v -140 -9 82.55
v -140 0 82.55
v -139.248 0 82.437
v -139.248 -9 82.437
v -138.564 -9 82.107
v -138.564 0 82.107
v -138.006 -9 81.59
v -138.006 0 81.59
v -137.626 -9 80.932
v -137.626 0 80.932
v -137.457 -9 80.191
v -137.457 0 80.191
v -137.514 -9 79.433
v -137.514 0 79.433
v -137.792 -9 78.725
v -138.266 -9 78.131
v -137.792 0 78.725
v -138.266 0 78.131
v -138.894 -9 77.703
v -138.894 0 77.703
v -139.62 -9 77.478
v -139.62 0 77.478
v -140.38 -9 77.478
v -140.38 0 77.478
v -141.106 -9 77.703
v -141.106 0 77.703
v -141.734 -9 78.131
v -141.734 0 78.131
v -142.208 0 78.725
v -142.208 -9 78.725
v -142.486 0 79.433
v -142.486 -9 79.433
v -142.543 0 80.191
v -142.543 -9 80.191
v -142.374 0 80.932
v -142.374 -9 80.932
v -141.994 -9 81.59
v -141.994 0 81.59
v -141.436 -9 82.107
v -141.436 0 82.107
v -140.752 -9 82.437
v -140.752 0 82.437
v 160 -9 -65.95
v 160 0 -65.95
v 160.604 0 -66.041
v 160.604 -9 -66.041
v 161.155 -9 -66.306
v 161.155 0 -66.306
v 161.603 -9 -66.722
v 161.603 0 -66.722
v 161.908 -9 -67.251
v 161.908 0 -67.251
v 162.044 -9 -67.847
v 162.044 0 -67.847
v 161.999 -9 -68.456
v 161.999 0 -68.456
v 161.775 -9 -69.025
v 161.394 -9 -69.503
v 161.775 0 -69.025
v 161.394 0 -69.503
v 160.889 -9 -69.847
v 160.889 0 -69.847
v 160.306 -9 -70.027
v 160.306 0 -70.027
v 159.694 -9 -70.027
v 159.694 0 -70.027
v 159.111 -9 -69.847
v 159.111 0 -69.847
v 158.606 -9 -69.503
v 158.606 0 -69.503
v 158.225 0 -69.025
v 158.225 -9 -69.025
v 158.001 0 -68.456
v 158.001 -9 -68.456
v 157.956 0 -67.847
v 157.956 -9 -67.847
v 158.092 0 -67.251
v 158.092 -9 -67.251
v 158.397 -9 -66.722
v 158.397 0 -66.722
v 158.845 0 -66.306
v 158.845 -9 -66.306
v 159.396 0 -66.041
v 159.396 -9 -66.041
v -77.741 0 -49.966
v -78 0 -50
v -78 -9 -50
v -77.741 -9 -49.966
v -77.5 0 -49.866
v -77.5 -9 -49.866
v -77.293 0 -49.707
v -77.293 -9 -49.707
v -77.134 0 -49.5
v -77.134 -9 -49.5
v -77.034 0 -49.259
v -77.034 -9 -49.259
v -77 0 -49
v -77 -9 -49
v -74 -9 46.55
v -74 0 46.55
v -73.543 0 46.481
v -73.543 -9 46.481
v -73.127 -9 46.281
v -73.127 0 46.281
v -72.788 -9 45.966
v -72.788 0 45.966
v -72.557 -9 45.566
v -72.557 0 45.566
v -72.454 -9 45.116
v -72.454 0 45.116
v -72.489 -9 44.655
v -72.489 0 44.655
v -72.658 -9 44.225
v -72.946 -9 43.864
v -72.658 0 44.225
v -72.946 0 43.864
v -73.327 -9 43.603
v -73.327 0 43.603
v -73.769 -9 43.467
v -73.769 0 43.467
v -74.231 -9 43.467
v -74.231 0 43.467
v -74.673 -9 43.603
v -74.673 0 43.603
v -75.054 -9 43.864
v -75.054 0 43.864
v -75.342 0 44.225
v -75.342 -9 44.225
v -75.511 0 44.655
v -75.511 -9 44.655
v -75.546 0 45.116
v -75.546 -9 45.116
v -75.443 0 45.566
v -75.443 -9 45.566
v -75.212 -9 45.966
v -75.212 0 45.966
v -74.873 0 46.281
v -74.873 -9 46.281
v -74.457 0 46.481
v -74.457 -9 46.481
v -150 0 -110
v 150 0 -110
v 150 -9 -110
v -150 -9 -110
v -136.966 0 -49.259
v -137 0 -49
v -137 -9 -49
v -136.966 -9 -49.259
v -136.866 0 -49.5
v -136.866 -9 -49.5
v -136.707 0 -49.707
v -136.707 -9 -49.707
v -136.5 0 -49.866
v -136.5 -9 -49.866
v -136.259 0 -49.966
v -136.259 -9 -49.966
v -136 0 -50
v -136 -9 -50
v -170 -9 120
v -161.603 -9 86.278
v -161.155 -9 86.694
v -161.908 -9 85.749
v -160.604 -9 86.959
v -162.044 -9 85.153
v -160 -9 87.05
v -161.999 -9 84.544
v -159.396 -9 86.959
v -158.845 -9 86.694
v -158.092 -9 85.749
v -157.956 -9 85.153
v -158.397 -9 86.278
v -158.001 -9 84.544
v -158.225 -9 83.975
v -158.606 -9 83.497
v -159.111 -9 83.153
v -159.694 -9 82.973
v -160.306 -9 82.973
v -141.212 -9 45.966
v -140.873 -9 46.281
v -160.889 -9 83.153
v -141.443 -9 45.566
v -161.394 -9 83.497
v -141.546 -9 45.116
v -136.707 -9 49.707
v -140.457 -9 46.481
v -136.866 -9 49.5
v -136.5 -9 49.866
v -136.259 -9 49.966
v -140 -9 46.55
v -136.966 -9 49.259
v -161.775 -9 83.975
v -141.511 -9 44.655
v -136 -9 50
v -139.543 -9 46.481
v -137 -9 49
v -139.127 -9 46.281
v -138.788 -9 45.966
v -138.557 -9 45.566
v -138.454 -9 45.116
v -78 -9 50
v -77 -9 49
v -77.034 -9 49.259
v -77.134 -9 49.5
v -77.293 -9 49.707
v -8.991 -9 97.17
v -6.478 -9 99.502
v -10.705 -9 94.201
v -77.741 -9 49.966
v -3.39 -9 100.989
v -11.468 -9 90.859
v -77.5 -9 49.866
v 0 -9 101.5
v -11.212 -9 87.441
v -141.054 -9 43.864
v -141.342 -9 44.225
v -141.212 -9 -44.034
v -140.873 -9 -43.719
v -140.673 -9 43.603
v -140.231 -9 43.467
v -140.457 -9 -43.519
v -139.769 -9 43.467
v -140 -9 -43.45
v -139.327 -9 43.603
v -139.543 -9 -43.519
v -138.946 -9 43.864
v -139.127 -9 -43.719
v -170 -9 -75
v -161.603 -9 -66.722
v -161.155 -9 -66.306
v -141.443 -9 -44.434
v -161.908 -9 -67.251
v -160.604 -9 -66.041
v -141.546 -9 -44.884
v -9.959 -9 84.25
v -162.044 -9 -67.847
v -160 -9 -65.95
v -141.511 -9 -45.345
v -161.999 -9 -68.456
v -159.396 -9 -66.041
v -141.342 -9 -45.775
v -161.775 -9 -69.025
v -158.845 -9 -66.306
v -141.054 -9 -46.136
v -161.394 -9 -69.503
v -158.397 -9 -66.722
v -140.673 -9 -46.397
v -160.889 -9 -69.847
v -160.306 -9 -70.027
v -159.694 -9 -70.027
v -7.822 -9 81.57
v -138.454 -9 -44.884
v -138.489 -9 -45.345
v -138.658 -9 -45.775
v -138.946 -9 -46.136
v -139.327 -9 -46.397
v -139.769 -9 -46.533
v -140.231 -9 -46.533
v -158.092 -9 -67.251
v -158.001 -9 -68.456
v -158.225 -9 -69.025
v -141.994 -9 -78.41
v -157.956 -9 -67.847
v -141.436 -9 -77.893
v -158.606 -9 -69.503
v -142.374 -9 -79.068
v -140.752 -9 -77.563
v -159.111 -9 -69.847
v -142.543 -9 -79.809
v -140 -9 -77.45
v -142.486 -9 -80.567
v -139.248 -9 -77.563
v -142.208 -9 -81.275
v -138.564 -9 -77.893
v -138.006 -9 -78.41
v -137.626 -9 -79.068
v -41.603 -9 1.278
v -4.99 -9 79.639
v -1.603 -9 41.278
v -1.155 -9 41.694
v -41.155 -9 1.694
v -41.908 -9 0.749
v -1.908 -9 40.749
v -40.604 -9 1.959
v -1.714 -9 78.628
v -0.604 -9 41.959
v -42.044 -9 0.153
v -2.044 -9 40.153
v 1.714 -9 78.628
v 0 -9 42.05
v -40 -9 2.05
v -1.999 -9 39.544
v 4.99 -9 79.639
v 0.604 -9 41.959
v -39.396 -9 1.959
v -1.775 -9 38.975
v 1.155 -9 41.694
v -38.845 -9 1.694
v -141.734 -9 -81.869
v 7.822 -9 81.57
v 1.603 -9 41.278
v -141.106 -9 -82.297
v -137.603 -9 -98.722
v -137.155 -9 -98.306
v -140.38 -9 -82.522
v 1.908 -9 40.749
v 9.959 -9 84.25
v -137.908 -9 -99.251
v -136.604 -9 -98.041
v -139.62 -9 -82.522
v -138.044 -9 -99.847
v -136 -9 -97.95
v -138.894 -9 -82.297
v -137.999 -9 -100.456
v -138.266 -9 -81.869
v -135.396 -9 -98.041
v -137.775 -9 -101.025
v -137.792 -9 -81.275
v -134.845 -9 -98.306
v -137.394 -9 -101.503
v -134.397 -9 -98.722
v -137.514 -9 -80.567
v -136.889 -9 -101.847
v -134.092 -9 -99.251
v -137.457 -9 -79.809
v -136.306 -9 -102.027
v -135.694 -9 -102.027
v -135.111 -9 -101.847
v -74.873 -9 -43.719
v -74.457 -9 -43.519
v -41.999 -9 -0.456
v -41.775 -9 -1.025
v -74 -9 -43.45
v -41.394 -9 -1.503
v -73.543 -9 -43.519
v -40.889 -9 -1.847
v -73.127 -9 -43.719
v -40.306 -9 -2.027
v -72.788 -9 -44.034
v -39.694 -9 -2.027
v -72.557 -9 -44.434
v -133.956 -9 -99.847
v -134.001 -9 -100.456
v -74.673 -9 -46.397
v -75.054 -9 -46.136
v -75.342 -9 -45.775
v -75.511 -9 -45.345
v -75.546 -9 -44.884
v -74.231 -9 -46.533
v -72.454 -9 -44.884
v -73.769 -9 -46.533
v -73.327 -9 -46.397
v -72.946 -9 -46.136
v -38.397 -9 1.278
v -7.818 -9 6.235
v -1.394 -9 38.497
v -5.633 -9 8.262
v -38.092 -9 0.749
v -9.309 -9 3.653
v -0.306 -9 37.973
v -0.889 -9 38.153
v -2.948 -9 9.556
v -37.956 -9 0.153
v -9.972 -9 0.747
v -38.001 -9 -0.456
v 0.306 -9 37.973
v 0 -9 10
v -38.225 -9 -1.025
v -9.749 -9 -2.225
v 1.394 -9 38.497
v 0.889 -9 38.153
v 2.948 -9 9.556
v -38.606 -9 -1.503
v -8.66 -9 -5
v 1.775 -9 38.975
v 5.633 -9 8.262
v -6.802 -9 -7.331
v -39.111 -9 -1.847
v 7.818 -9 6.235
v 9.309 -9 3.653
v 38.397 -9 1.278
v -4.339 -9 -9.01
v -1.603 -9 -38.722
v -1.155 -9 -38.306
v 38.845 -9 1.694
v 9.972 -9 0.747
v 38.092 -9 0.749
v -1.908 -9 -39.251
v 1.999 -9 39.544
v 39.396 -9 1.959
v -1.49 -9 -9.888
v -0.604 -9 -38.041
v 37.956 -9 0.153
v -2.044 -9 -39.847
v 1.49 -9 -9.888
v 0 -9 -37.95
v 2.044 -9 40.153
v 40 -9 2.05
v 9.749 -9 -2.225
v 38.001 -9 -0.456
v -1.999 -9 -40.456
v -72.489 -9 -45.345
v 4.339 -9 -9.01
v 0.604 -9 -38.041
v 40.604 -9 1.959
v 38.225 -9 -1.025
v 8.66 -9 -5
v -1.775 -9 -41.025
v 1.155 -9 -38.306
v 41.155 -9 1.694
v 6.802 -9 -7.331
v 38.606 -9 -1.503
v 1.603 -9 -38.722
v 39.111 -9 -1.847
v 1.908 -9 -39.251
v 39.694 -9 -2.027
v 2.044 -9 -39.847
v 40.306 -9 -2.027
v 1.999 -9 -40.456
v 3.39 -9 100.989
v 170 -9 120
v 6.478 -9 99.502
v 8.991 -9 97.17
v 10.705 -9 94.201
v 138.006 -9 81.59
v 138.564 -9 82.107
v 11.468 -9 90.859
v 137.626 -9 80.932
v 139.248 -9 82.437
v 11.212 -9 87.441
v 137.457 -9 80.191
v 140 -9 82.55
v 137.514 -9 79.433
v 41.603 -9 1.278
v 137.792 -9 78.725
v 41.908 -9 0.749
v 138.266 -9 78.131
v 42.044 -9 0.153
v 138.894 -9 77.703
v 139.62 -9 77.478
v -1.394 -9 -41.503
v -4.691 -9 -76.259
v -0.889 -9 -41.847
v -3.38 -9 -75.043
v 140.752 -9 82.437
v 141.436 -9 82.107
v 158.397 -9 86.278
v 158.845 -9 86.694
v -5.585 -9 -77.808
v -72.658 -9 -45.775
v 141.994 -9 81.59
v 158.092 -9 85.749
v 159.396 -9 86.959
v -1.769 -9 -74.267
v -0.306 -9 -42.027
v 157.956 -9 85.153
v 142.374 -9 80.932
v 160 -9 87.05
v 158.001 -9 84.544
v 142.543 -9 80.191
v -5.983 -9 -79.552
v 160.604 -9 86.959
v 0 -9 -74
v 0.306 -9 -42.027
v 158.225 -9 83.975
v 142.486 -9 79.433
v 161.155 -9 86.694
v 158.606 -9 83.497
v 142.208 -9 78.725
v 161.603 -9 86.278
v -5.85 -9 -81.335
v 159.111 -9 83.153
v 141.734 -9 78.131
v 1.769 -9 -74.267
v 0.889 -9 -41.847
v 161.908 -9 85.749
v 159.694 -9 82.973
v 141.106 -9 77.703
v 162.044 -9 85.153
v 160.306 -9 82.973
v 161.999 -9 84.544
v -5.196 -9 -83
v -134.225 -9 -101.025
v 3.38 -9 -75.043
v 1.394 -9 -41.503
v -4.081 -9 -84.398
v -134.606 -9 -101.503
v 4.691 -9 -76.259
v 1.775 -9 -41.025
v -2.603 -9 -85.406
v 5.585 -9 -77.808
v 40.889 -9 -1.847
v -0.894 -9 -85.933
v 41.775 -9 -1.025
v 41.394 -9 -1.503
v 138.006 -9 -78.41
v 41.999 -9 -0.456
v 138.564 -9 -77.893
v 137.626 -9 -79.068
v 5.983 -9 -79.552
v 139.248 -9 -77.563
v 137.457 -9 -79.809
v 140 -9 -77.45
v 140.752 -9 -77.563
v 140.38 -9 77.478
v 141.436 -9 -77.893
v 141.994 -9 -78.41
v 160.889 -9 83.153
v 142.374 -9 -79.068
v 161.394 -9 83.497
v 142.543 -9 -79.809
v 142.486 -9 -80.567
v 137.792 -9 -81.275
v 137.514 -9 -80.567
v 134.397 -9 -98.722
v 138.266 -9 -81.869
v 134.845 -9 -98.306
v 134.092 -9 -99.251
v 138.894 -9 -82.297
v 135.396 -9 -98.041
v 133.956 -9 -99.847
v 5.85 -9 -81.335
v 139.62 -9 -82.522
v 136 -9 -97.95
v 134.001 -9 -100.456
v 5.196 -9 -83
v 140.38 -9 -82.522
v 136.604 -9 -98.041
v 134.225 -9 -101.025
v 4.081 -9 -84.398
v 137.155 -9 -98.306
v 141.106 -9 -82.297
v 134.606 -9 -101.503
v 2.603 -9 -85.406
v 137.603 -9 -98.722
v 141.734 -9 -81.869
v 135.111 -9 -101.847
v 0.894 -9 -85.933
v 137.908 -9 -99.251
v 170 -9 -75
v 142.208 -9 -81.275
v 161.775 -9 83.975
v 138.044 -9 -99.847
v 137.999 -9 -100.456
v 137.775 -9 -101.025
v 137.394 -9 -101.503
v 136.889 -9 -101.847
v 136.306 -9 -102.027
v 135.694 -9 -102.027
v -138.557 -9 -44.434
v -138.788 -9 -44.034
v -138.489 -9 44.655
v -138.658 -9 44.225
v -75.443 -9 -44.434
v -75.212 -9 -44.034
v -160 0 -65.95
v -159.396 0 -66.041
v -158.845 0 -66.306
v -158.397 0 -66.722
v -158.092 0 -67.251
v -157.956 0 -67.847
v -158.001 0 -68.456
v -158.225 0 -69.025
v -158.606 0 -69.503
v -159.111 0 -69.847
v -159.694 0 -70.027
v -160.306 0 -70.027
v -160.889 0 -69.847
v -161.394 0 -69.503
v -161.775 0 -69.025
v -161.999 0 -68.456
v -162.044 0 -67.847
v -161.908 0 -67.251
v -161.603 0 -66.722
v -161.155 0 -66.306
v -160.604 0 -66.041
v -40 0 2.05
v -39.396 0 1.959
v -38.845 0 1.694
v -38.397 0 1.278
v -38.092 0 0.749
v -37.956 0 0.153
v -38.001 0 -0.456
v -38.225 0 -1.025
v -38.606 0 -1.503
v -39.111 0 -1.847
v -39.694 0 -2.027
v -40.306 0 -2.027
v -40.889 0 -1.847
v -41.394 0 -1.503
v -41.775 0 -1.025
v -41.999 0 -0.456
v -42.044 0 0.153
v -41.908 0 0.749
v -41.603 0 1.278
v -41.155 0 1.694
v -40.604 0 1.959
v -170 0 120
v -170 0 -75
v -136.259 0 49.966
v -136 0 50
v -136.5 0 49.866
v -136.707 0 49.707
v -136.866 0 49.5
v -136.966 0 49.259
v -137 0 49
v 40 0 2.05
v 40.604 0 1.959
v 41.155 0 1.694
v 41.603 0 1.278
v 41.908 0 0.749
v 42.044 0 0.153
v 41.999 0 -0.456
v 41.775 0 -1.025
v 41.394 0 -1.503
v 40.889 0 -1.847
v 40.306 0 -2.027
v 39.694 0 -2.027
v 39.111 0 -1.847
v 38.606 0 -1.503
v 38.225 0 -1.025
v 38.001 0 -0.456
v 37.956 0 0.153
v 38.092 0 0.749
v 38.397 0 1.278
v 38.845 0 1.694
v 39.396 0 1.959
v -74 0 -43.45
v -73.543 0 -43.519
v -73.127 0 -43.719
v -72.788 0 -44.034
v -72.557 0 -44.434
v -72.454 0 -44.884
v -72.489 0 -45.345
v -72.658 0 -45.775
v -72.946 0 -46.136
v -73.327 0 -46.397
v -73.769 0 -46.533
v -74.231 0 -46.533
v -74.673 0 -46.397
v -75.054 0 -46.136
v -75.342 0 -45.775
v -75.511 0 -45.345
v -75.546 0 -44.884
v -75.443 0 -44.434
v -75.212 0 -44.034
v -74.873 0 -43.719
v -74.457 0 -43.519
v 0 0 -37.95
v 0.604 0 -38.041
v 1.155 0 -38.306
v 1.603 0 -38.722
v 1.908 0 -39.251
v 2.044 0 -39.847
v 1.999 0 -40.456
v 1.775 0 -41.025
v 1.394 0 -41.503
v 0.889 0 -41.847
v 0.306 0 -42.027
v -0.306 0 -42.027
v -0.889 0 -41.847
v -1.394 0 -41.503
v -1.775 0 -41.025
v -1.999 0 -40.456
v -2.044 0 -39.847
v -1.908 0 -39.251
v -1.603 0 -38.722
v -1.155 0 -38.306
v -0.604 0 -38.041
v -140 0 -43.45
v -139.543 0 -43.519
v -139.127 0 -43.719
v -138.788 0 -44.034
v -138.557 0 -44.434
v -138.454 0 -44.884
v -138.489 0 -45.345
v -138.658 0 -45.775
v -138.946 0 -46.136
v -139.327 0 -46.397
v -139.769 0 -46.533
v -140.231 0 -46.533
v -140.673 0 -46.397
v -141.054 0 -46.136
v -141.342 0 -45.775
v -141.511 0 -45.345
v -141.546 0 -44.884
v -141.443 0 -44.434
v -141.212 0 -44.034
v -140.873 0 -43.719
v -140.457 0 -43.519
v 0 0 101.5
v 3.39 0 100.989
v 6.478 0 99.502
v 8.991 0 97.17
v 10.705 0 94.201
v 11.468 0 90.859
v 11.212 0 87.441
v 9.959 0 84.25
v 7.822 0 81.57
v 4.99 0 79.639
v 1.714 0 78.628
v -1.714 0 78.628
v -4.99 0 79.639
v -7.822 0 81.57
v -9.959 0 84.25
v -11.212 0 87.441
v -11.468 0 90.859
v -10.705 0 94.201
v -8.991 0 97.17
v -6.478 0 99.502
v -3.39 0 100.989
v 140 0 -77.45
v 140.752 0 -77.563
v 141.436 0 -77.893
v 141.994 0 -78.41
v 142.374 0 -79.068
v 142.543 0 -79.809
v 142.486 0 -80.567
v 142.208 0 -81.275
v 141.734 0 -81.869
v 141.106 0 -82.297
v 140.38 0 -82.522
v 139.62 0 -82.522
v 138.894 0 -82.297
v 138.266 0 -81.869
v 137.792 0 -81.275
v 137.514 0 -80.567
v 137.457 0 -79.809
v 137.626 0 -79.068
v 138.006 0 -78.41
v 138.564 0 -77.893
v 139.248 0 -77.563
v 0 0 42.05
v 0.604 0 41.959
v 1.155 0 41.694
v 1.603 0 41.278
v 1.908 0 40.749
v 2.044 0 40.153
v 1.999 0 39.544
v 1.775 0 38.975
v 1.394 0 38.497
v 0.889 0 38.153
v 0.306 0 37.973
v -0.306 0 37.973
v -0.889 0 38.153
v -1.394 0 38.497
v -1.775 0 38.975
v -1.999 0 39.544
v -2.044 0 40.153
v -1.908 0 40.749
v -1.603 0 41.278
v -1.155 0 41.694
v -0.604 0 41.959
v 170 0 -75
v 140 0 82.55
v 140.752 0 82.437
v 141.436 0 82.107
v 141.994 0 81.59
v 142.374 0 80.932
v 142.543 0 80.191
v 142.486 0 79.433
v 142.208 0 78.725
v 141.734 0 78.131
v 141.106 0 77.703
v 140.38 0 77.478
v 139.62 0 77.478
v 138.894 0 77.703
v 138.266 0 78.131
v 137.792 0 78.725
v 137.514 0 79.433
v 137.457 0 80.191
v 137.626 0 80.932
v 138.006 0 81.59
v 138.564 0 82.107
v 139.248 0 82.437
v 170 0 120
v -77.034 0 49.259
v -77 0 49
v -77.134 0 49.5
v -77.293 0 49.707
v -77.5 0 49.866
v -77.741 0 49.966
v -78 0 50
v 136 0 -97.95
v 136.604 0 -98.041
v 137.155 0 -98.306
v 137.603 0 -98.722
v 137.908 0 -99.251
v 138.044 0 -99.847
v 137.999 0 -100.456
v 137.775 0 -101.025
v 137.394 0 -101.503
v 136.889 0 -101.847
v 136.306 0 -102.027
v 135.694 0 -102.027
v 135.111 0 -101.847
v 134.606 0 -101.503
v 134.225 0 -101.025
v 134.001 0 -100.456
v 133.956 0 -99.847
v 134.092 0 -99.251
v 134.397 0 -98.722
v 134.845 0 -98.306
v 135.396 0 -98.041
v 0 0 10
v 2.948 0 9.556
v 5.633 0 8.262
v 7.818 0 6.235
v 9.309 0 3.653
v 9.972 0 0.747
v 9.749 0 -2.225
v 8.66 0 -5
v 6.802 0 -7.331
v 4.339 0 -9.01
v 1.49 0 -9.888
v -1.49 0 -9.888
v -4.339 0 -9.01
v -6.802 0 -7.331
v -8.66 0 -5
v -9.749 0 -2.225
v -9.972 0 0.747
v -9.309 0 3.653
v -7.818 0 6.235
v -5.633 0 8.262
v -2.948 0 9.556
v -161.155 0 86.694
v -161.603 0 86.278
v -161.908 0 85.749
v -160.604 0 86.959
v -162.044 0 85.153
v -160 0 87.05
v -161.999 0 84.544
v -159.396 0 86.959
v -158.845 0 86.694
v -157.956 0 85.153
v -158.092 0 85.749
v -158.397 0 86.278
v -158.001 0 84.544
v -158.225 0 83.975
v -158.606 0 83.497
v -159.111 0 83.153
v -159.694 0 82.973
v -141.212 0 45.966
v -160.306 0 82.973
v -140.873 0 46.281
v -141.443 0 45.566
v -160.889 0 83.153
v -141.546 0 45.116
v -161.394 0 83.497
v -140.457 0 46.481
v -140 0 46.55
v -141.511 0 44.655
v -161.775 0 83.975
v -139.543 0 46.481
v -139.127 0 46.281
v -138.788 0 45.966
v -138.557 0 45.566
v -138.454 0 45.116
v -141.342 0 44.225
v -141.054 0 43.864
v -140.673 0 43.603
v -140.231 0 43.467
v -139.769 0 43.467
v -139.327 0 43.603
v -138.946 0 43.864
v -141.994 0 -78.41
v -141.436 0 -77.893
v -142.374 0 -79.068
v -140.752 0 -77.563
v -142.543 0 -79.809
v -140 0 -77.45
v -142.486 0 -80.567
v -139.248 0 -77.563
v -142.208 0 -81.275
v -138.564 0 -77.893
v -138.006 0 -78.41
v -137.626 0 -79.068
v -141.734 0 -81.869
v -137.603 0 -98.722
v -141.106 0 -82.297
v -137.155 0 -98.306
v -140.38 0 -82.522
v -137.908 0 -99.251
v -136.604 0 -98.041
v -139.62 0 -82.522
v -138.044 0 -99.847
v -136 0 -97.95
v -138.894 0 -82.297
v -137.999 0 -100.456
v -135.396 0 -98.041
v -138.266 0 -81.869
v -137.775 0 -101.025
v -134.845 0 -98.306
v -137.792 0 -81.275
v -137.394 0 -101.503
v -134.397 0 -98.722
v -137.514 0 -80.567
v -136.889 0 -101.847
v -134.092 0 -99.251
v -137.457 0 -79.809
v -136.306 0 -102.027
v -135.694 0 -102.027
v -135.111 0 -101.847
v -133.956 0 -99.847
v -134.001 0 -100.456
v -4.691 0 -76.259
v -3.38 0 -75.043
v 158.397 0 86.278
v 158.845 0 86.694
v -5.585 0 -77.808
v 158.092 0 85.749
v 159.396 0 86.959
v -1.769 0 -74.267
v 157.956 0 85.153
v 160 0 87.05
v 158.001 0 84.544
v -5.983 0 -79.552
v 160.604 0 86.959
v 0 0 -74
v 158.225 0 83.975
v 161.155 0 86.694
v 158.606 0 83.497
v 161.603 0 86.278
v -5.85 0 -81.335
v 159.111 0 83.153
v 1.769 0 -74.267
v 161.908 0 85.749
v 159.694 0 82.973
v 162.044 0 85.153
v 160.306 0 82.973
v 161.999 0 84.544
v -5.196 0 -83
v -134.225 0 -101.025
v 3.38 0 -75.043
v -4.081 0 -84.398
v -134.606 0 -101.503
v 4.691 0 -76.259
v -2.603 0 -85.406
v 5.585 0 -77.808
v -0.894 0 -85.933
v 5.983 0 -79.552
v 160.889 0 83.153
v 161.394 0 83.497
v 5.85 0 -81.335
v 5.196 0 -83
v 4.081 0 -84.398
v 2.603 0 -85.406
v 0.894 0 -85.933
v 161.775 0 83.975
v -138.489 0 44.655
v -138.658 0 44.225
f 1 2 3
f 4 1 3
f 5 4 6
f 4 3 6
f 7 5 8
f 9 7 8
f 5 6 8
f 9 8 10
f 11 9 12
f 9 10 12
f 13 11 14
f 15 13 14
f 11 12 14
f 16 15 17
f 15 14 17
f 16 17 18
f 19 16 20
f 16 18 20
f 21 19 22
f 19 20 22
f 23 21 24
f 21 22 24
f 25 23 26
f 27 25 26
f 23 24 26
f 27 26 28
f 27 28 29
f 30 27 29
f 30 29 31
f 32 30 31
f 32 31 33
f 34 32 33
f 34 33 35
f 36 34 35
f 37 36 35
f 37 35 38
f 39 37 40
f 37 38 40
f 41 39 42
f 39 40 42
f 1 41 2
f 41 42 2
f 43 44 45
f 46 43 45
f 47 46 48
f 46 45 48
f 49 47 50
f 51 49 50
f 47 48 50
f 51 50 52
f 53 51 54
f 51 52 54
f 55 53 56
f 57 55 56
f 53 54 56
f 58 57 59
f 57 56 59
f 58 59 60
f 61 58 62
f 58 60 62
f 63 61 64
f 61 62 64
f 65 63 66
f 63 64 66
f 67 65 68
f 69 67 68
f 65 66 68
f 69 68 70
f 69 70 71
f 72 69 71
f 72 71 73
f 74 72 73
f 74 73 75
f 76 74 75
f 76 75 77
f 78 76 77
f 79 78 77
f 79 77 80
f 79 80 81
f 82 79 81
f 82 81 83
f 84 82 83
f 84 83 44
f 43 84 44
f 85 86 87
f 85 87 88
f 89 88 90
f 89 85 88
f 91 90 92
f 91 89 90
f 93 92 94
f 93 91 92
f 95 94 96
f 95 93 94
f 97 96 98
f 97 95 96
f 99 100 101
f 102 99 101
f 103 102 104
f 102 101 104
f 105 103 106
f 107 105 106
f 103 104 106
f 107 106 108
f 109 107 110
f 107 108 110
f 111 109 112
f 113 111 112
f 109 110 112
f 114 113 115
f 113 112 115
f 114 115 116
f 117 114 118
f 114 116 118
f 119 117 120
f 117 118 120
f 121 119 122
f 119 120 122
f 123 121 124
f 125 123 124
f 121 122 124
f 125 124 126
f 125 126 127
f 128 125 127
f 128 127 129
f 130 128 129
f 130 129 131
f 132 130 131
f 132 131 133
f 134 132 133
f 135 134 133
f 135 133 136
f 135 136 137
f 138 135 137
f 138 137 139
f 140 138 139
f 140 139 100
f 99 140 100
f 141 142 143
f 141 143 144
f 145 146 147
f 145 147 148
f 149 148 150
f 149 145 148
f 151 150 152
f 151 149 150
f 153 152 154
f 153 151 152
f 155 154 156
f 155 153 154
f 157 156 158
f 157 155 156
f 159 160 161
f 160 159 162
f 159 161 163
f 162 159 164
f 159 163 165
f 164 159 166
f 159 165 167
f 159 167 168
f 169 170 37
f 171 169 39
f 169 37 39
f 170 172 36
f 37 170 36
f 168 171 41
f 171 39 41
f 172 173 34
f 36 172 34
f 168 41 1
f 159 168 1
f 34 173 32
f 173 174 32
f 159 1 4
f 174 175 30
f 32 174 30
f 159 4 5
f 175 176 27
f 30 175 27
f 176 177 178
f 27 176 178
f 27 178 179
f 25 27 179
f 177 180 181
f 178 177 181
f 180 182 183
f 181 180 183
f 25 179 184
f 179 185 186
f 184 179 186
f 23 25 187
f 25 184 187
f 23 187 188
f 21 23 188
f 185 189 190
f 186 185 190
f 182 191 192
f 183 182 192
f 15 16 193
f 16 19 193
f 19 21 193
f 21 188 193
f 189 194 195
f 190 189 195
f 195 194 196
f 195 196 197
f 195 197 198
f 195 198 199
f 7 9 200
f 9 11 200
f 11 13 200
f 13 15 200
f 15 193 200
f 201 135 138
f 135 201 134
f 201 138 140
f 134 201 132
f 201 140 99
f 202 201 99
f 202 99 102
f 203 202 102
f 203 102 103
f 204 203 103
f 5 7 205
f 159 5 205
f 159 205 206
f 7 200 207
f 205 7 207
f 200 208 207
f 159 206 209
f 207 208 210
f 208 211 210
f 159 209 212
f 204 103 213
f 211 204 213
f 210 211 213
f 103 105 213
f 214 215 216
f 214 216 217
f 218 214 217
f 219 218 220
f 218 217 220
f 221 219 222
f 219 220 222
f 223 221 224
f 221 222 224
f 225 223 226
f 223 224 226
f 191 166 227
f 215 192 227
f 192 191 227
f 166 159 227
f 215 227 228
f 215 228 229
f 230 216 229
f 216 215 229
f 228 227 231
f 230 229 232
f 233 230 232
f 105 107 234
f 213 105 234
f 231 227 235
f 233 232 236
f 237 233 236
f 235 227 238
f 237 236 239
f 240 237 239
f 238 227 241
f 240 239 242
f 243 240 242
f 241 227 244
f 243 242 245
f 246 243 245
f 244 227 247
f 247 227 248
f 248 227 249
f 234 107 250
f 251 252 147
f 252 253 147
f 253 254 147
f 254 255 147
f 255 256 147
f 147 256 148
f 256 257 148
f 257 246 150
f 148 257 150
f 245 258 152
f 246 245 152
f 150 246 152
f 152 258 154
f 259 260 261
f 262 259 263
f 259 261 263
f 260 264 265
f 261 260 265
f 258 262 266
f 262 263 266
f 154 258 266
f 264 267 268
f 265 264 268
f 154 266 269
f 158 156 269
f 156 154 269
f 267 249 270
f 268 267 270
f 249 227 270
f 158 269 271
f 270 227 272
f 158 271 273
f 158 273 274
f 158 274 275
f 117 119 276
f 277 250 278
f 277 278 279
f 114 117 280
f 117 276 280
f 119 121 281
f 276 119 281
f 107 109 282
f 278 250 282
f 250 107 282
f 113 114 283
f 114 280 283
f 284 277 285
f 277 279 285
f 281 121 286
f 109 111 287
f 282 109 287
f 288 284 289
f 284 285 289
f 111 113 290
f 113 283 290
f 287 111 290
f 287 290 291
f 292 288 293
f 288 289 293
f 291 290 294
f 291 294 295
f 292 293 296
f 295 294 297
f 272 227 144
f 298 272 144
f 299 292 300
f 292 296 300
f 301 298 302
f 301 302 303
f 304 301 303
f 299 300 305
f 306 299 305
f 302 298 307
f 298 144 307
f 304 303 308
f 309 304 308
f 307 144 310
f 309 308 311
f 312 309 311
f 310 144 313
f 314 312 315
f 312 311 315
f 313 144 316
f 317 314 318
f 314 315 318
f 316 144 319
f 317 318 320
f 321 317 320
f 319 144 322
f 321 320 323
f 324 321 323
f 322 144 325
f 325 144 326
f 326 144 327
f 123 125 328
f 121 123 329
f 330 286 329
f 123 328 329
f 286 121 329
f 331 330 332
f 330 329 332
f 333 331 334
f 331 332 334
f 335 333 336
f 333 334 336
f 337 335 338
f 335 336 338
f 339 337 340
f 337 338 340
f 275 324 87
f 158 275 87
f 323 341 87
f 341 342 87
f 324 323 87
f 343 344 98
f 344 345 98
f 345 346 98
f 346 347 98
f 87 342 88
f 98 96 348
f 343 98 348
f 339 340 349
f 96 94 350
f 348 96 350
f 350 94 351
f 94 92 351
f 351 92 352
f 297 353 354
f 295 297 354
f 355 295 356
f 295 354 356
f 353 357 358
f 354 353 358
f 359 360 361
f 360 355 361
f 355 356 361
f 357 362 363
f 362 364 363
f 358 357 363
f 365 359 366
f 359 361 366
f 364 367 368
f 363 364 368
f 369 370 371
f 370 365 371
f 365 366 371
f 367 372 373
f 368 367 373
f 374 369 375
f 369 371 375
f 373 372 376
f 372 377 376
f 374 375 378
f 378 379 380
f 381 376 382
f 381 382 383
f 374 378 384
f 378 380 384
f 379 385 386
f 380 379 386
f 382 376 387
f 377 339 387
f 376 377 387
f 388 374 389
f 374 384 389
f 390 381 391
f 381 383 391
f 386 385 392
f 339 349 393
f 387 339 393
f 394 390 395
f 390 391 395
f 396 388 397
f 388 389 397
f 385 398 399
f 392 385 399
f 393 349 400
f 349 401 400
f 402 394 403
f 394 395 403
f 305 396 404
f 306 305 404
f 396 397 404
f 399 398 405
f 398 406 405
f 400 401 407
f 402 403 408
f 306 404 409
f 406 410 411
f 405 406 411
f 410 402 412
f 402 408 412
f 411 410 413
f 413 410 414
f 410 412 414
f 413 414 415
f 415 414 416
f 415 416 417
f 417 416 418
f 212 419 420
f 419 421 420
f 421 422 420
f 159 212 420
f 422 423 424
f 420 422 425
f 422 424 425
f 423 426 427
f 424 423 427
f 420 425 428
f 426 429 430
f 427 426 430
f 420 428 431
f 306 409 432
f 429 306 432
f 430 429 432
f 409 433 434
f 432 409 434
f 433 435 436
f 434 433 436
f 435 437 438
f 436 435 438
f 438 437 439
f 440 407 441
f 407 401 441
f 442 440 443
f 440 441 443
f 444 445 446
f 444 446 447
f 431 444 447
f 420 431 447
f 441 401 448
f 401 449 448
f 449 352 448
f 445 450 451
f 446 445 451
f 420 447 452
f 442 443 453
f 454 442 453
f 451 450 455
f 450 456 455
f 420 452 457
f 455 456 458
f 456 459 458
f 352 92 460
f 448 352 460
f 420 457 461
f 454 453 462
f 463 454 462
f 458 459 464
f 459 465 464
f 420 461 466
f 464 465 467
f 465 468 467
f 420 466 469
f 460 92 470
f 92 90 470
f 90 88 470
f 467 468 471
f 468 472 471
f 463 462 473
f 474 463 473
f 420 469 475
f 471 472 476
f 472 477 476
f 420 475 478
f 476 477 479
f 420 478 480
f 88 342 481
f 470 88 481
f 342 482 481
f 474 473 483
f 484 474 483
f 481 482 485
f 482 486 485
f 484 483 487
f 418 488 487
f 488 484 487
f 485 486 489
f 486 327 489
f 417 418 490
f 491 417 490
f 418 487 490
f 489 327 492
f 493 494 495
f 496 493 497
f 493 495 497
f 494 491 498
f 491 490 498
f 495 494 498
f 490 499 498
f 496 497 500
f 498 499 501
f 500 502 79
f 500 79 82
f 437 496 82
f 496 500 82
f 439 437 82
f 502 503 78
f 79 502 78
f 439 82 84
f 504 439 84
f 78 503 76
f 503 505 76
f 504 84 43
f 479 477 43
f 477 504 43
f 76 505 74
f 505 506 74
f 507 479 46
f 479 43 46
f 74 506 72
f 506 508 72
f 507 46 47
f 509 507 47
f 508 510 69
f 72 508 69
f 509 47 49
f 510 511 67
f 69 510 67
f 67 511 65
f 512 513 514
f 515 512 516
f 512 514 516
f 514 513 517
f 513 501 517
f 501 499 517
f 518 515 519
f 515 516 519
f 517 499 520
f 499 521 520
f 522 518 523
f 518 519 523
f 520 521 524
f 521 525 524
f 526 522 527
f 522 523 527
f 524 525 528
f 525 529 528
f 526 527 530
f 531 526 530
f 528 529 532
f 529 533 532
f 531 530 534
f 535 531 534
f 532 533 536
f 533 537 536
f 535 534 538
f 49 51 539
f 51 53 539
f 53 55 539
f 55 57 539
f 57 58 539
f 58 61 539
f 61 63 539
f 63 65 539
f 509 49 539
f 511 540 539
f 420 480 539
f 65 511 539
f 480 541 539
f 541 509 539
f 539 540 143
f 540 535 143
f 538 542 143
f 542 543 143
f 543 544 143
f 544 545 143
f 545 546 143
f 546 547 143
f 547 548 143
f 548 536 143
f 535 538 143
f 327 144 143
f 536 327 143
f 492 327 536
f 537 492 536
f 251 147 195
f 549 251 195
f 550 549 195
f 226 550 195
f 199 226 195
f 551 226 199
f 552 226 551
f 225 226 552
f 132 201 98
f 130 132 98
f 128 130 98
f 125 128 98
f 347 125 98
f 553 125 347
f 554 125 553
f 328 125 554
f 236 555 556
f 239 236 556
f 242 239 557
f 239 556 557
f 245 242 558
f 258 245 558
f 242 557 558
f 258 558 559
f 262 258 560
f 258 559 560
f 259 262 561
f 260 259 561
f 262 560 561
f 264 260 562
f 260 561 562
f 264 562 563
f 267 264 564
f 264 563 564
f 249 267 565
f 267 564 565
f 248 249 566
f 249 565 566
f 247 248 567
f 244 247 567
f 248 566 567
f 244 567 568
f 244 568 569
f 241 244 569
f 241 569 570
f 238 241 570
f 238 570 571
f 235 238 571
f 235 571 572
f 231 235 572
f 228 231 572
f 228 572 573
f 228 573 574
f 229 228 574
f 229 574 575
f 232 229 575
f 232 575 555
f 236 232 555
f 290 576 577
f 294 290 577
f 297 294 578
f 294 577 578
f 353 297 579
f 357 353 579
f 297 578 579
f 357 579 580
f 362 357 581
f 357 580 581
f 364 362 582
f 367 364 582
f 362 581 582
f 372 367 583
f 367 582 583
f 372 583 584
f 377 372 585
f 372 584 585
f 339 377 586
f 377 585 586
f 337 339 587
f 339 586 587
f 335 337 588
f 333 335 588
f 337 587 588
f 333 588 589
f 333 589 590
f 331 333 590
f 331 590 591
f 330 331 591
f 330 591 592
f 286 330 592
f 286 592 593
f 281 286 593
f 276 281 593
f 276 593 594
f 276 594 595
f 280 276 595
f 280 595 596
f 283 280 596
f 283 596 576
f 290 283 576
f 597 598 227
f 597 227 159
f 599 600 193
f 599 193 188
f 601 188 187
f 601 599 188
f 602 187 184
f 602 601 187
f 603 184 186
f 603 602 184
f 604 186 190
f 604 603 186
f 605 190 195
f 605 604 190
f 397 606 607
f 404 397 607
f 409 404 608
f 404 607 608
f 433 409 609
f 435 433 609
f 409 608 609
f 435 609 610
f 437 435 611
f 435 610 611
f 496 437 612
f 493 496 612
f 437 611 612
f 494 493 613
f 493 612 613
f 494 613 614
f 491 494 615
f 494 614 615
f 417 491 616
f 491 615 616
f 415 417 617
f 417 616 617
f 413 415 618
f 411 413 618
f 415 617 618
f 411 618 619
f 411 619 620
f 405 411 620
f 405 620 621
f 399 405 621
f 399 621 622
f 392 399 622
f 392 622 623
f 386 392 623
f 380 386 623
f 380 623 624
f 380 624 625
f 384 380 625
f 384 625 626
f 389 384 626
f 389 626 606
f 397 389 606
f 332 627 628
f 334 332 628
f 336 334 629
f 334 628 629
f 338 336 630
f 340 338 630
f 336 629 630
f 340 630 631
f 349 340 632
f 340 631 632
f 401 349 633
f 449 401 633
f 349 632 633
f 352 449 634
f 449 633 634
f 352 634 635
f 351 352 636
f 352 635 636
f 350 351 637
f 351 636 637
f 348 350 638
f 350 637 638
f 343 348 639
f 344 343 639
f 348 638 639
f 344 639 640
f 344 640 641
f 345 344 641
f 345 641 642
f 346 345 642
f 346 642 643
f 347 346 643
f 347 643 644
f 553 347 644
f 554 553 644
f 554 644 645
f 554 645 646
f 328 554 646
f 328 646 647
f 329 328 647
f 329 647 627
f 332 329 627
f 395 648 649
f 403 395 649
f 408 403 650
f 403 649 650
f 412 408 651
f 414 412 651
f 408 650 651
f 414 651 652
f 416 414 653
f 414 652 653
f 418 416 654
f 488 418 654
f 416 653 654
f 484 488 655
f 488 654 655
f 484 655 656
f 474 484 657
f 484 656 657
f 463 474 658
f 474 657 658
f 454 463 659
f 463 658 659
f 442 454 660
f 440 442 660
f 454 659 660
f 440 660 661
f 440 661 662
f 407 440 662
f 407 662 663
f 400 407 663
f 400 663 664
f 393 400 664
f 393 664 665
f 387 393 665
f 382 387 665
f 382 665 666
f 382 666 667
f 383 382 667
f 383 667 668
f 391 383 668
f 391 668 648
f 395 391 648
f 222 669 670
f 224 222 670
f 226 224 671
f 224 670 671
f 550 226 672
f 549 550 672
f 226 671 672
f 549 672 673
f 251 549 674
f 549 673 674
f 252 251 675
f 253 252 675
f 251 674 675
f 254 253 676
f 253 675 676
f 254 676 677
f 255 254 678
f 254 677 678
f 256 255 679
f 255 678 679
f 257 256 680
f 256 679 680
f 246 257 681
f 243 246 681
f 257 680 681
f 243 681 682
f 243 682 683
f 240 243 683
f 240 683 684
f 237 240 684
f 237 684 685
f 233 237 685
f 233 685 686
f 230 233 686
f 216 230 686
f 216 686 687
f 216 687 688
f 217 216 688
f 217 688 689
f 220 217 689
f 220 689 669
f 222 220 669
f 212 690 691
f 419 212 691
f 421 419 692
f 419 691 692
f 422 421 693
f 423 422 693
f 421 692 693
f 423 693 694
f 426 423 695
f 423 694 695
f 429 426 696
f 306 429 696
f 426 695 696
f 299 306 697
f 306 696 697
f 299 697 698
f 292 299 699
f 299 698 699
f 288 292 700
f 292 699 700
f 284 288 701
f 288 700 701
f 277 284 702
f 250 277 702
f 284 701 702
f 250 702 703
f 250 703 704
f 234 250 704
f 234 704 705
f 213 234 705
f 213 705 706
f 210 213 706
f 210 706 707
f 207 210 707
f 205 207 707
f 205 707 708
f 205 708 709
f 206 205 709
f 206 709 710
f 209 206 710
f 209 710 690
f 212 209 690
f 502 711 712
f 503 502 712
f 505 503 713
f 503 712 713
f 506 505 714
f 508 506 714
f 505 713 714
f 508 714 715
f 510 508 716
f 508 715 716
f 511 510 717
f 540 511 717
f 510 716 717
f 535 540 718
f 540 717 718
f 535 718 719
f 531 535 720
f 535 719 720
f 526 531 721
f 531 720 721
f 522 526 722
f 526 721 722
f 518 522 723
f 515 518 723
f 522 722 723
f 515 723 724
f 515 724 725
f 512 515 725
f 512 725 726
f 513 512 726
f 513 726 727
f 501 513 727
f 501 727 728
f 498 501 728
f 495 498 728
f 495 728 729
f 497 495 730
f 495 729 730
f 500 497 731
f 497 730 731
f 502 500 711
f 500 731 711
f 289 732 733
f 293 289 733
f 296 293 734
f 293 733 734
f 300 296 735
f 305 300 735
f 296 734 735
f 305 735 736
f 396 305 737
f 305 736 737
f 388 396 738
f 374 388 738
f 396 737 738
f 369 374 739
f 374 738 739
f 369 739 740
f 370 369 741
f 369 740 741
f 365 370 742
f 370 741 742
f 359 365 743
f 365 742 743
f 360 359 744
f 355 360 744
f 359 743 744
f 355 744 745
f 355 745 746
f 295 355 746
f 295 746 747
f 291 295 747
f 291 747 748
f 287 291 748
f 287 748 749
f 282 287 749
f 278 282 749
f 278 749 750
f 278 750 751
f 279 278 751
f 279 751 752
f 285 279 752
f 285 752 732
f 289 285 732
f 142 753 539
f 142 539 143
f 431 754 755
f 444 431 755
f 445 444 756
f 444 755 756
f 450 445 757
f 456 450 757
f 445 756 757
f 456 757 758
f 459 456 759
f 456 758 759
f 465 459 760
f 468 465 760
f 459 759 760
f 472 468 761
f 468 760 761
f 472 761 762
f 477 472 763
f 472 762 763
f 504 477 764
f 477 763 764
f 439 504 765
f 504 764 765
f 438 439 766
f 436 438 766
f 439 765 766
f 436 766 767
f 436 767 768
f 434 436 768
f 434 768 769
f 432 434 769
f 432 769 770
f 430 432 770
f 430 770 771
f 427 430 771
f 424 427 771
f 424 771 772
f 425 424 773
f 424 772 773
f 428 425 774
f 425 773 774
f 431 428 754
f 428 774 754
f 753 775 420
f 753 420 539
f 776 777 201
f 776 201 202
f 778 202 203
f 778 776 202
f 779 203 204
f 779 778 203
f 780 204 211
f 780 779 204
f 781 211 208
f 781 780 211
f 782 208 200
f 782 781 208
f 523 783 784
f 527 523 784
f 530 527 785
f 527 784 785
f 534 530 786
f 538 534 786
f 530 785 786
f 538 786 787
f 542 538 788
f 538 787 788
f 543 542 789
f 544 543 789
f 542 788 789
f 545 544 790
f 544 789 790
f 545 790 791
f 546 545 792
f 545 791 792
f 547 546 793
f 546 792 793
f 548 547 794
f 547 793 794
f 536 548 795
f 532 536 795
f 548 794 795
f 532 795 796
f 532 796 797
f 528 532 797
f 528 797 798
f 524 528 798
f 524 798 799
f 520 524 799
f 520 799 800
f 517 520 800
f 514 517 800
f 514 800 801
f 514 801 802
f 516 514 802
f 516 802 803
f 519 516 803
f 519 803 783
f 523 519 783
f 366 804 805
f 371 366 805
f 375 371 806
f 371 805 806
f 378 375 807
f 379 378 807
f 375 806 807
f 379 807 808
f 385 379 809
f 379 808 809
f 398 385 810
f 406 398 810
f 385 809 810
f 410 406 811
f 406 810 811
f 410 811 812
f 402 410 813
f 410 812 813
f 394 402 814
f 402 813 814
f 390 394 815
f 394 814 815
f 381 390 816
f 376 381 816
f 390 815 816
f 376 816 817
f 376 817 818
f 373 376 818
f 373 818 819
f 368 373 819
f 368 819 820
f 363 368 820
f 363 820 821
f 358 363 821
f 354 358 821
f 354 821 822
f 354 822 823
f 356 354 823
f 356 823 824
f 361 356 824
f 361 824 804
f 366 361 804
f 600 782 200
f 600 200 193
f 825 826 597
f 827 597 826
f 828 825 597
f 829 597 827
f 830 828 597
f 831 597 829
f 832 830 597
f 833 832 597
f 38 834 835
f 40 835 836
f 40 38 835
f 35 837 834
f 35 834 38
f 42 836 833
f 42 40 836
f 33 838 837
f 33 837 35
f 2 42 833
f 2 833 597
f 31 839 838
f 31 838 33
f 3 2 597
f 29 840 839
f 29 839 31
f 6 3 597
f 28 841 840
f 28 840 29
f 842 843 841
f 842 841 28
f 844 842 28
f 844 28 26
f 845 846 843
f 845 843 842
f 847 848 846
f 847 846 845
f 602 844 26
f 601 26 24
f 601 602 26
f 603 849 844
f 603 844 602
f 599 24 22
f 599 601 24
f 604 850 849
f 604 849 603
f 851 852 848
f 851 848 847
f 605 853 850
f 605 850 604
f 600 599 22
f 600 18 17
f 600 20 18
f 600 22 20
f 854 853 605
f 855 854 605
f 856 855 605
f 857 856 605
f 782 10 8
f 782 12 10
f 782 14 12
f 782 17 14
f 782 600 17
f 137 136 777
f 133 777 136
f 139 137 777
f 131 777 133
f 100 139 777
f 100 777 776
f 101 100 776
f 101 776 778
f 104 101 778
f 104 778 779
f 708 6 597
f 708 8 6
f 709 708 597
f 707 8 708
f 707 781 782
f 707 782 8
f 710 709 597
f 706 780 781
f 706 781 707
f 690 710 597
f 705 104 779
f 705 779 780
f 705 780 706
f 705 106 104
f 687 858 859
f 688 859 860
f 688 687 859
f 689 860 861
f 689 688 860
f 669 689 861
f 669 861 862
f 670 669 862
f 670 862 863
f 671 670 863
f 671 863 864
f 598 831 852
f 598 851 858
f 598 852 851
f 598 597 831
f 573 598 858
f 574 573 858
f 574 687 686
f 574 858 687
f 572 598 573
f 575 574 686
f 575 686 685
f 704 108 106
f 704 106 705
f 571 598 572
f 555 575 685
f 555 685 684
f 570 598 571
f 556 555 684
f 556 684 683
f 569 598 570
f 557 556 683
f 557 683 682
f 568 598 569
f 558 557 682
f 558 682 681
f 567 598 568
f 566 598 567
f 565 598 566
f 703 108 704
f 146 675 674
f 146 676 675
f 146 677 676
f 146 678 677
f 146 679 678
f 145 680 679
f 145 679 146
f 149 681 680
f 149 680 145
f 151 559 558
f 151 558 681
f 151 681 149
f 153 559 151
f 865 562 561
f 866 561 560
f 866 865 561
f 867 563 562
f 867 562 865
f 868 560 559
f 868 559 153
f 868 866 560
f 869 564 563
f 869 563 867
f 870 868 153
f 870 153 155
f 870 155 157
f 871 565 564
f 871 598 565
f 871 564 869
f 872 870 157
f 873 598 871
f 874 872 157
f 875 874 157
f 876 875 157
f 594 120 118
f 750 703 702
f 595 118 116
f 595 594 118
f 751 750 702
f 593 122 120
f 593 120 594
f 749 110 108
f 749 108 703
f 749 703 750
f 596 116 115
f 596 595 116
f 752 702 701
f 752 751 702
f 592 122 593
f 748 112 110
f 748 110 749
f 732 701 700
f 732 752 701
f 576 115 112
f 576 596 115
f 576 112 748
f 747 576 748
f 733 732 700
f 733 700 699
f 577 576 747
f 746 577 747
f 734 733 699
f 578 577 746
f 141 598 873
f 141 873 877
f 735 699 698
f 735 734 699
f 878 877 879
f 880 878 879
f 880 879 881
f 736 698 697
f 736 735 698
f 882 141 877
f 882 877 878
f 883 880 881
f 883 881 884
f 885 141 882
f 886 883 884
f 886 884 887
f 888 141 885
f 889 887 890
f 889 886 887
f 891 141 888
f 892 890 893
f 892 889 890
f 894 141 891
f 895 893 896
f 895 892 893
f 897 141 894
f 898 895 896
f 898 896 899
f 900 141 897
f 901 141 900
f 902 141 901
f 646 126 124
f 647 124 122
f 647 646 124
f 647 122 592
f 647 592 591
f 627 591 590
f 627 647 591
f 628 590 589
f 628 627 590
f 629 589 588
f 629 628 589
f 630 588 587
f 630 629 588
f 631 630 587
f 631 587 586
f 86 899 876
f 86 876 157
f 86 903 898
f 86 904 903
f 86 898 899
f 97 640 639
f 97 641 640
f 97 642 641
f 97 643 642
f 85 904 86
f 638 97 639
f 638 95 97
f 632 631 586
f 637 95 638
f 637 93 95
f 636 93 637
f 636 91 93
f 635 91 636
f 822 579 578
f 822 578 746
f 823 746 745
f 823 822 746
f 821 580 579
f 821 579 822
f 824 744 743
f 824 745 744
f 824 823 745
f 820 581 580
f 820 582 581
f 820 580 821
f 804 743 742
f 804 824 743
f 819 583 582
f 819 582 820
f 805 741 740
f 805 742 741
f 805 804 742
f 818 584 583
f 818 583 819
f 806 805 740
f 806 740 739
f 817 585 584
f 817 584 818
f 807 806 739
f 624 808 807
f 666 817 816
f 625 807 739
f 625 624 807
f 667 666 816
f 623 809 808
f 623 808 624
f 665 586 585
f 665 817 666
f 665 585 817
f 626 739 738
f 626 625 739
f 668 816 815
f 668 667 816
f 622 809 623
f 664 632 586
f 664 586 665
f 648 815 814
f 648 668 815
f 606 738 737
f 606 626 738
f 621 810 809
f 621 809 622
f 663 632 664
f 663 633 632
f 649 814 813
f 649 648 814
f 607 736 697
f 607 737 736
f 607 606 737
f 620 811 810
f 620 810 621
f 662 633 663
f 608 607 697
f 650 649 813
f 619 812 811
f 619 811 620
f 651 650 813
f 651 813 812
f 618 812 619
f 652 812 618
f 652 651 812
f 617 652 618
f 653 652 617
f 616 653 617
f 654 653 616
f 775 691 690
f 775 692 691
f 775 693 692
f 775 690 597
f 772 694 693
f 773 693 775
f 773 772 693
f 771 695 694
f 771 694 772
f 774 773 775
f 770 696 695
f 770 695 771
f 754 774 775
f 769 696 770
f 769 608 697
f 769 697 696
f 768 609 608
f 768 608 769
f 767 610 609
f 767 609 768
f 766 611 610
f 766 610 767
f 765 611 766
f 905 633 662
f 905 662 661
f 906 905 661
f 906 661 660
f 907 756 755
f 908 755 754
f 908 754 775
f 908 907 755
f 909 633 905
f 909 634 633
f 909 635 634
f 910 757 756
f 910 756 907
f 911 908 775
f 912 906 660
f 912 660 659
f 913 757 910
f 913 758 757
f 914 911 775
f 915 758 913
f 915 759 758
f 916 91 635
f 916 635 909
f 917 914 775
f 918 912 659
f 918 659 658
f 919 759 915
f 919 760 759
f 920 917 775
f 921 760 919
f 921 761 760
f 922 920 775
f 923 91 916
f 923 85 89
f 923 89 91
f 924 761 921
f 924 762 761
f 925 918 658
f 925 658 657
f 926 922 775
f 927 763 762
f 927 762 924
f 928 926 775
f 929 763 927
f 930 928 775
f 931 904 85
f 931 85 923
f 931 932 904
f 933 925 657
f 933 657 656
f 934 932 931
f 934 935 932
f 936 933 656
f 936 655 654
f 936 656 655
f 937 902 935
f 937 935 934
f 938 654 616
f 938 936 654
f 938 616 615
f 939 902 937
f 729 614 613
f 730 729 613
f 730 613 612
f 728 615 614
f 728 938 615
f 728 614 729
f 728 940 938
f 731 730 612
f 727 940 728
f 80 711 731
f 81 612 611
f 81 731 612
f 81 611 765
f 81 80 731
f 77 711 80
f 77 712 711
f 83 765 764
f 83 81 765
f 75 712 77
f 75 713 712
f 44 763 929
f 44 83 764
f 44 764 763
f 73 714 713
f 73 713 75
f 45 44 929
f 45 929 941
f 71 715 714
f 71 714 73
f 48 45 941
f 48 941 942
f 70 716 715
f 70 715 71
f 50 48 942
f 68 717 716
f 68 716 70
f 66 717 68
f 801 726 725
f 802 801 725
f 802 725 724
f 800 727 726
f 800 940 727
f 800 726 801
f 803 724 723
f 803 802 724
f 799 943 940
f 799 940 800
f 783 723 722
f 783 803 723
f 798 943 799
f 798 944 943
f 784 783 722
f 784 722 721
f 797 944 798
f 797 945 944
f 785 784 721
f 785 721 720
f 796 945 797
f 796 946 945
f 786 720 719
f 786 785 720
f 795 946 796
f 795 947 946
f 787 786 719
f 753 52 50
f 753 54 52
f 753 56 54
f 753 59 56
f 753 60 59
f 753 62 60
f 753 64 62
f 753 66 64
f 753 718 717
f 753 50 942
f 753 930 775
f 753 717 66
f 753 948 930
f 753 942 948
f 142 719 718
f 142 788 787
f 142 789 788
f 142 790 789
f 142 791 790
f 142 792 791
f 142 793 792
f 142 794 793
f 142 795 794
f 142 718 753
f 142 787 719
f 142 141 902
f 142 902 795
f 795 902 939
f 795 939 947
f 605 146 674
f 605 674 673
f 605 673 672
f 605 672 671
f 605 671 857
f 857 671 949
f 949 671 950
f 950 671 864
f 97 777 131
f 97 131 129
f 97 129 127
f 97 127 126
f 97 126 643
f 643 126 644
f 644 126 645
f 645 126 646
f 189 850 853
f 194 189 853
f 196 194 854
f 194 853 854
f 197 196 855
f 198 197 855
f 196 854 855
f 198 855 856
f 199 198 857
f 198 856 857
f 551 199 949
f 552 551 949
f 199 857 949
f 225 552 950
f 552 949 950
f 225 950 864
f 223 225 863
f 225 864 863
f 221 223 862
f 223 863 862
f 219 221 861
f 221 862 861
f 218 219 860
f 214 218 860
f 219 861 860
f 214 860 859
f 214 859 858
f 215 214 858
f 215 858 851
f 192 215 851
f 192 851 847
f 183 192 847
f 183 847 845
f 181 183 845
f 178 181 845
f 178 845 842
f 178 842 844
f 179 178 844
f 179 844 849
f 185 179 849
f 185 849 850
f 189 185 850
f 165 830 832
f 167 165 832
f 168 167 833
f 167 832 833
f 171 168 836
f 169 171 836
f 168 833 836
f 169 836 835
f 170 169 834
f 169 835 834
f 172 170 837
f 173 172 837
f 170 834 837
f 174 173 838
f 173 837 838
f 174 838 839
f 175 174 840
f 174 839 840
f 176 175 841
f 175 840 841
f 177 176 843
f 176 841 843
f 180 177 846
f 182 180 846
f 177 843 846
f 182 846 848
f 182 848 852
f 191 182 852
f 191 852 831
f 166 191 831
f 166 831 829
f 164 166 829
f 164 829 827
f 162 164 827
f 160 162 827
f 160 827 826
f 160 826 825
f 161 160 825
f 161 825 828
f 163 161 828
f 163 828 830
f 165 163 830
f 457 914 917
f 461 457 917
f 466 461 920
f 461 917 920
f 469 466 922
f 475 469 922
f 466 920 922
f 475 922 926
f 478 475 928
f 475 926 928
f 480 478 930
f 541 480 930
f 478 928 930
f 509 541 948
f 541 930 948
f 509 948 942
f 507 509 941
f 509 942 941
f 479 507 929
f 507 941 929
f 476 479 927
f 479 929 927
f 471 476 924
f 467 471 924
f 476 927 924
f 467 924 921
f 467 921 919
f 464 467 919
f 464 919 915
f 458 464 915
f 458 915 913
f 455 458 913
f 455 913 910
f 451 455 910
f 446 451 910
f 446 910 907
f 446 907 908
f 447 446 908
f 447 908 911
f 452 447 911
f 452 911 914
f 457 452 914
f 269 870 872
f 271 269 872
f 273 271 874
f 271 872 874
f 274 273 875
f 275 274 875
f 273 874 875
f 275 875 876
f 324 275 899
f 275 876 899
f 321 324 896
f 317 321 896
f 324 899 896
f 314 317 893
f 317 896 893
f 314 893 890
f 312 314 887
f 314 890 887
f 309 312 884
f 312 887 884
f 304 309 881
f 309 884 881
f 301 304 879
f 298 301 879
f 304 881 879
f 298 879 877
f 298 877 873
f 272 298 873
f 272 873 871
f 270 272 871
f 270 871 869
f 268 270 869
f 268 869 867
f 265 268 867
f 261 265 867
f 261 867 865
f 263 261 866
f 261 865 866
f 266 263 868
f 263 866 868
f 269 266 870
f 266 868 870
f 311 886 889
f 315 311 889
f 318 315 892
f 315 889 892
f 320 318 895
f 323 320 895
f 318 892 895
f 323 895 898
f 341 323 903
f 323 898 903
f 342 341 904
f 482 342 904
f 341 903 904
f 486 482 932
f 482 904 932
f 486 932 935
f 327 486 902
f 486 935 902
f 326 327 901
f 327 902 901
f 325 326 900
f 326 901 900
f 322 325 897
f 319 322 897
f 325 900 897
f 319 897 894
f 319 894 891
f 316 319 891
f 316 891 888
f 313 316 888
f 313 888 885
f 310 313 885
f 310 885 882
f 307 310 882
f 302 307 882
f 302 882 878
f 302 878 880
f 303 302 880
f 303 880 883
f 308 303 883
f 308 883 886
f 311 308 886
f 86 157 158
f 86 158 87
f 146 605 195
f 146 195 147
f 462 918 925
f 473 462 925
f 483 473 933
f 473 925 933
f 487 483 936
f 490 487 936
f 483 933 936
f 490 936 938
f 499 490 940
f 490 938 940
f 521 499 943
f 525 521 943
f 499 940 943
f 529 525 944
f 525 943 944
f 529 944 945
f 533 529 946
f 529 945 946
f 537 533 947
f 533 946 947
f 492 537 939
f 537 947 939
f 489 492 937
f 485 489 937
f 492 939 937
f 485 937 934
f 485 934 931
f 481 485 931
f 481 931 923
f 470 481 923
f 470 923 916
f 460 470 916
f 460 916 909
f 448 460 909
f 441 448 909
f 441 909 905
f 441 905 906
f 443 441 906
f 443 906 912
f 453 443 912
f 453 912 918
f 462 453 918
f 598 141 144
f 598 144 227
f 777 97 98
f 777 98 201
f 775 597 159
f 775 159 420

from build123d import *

# Parameters (mm, degrees)
ESQUISSE3_R             = 2.55
STRUCTURE_DEPTH         = 9
ESQUISSE4_R             = 10
ESQUISSE4_R_2           = 11.5
ESQUISSE4_R_3           = 2.05
ESQUISSE4_R_4           = 6
ENL_V_MAT_EXTRU_1_DEPTH = 10
ESQUISSE5_OUTSIDE_W     = 424.118
ESQUISSE5_OUTSIDE_H     = 314.118
ESQUISSE5_OUTSIDE_R     = 2.55
ESQUISSE5_OUTSIDE_R_2   = 2.05
ENL_V_MAT_EXTRU_2_DEPTH = 10
ESQUISSE6_R             = 1.55
ENL_V_MAT_EXTRU_3_DEPTH = 209.281060109


with BuildPart() as part:
    # Esquisse3 → structure (new body)
    with BuildSketch(Plane(origin=(0, 0, 0), x_dir=(1, 0, 0), z_dir=(0, 1, 0))):
        Polygon((-170, 0), (-170, -120), (170, -120), (170, 0), (170, 75), (150, 110), (-150, 110), (-170, 75), align=None)
        with Locations(Location((-140, -80, 0), (0, 0, 270))):
            Circle(ESQUISSE3_R, mode=Mode.SUBTRACT)
        with Locations(Location((-140, 80, 0), (0, 0, 270))):
            Circle(ESQUISSE3_R, mode=Mode.SUBTRACT)
        with Locations(Location((140, -80, 0), (0, 0, 270))):
            Circle(ESQUISSE3_R, mode=Mode.SUBTRACT)
        with Locations(Location((140, 80, 0), (0, 0, 270))):
            Circle(ESQUISSE3_R, mode=Mode.SUBTRACT)
    extrude(amount=-STRUCTURE_DEPTH)

    # Esquisse4 → Enlèv. mat.-Extru.1 (cut)
    with BuildSketch(Plane(origin=(0, 0, 0), x_dir=(1, 0, 0), z_dir=(0, 1, 0))):
        with Locations(Location((0, 0, 0), (0, 0, 270))):
            Circle(ESQUISSE4_R)
        with Locations(Location((0, -90, 0), (0, 0, 270))):
            Circle(ESQUISSE4_R_2)
        with Locations(Location((0, 40, 0), (0, 0, 270))):
            Circle(ESQUISSE4_R_3)
        with Locations(Location((40, 0, 0), (0, 0, 270))):
            Circle(ESQUISSE4_R_3)
        with Locations(Location((0, -40, 0), (0, 0, 270))):
            Circle(ESQUISSE4_R_3)
        with Locations(Location((-40, 0, 0), (0, 0, 270))):
            Circle(ESQUISSE4_R_3)
        with Locations(Location((0, 80, 0), (0, 0, 270))):
            Circle(ESQUISSE4_R_4)
    extrude(amount=-ENL_V_MAT_EXTRU_1_DEPTH, mode=Mode.SUBTRACT)

    # Esquisse5 outside → Enlèv. mat.-Extru.2 (cut)
    # profile 1 of 9: a face of its own
    with BuildSketch(Plane(origin=(0, 0, 0), x_dir=(1, 0, 0), z_dir=(0, 1, 0))):
        with Locations((0, -5)):
            Rectangle(ESQUISSE5_OUTSIDE_W, ESQUISSE5_OUTSIDE_H)
        Polygon((-170, 75), (-170, -120), (170, -120), (170, 75), (150, 110), (-150, 110), align=None, mode=Mode.SUBTRACT)
    # profile 2 of 9: a face of its own
    with BuildSketch(Plane(origin=(0, 0, 0), x_dir=(1, 0, 0), z_dir=(0, 1, 0))):
        with Locations(Location((-140, 80, 0), (0, 0, 270))):
            Circle(ESQUISSE5_OUTSIDE_R)
    # profile 3 of 9: a face of its own
    with BuildSketch(Plane(origin=(0, 0, 0), x_dir=(1, 0, 0), z_dir=(0, 1, 0))):
        with Locations(Location((-140, -80, 0), (0, 0, 270))):
            Circle(ESQUISSE5_OUTSIDE_R)
    # profile 4 of 9: a face of its own
    with BuildSketch(Plane(origin=(0, 0, 0), x_dir=(1, 0, 0), z_dir=(0, 1, 0))):
        with Locations(Location((-136, 100, 0), (0, 0, 270))):
            Circle(ESQUISSE5_OUTSIDE_R_2)
    # profile 5 of 9: a face of its own
    with BuildSketch(Plane(origin=(0, 0, 0), x_dir=(1, 0, 0), z_dir=(0, 1, 0))):
        with Locations(Location((-160, 68, 0), (0, 0, 270))):
            Circle(ESQUISSE5_OUTSIDE_R_2)
    # profile 6 of 9: a face of its own
    with BuildSketch(Plane(origin=(0, 0, 0), x_dir=(1, 0, 0), z_dir=(0, 1, 0))):
        with Locations(Location((-160, -85, 0), (0, 0, 270))):
            Circle(ESQUISSE5_OUTSIDE_R_2)
    # profile 7 of 9: a face of its own
    with BuildSketch(Plane(origin=(0, 0, 0), x_dir=(1, 0, 0), z_dir=(0, 1, 0))):
        with Locations(Location((160, -85, 0), (0, 0, 270))):
            Circle(ESQUISSE5_OUTSIDE_R_2)
    # profile 8 of 9: a face of its own
    with BuildSketch(Plane(origin=(0, 0, 0), x_dir=(1, 0, 0), z_dir=(0, 1, 0))):
        with Locations(Location((160, 68, 0), (0, 0, 270))):
            Circle(ESQUISSE5_OUTSIDE_R_2)
    # profile 9 of 9: a face of its own
    with BuildSketch(Plane(origin=(0, 0, 0), x_dir=(1, 0, 0), z_dir=(0, 1, 0))):
        with Locations(Location((136, 100, 0), (0, 0, 270))):
            Circle(ESQUISSE5_OUTSIDE_R_2)
    extrude(amount=-ENL_V_MAT_EXTRU_2_DEPTH, mode=Mode.SUBTRACT)

    # Esquisse6 → Enlèv. mat.-Extru.3 (cut, through all)
    with BuildSketch(Plane(origin=(0, 0, 0), x_dir=(1, 0, 0), z_dir=(0, 1, 0))):
        with Locations(Location((-140, 45, 0), (0, 0, 270))):
            Circle(ESQUISSE6_R)
        with Locations(Location((-74, 45, 0), (0, 0, 270))):
            Circle(ESQUISSE6_R)
        with Locations(Location((-140, -45, 0), (0, 0, 270))):
            Circle(ESQUISSE6_R)
        with Locations(Location((-74, -45, 0), (0, 0, 270))):
            Circle(ESQUISSE6_R)
        with BuildLine():
            Line((-78, -50), (-136, -50))
            ThreePointArc((-136, -50), (-136.707106781, -49.707106781), (-137, -49))
            Line((-137, -49), (-137, 49))
            ThreePointArc((-137, 49), (-136.707106781, 49.707106781), (-136, 50))
            Line((-136, 50), (-78, 50))
            ThreePointArc((-78, 50), (-77.292893219, 49.707106781), (-77, 49))
            Line((-77, 49), (-77, -49))
            ThreePointArc((-77, -49), (-77.292893219, -49.707106781), (-78, -50))
        make_face()
    extrude(amount=-ENL_V_MAT_EXTRU_3_DEPTH, mode=Mode.SUBTRACT)


solid = part.part
